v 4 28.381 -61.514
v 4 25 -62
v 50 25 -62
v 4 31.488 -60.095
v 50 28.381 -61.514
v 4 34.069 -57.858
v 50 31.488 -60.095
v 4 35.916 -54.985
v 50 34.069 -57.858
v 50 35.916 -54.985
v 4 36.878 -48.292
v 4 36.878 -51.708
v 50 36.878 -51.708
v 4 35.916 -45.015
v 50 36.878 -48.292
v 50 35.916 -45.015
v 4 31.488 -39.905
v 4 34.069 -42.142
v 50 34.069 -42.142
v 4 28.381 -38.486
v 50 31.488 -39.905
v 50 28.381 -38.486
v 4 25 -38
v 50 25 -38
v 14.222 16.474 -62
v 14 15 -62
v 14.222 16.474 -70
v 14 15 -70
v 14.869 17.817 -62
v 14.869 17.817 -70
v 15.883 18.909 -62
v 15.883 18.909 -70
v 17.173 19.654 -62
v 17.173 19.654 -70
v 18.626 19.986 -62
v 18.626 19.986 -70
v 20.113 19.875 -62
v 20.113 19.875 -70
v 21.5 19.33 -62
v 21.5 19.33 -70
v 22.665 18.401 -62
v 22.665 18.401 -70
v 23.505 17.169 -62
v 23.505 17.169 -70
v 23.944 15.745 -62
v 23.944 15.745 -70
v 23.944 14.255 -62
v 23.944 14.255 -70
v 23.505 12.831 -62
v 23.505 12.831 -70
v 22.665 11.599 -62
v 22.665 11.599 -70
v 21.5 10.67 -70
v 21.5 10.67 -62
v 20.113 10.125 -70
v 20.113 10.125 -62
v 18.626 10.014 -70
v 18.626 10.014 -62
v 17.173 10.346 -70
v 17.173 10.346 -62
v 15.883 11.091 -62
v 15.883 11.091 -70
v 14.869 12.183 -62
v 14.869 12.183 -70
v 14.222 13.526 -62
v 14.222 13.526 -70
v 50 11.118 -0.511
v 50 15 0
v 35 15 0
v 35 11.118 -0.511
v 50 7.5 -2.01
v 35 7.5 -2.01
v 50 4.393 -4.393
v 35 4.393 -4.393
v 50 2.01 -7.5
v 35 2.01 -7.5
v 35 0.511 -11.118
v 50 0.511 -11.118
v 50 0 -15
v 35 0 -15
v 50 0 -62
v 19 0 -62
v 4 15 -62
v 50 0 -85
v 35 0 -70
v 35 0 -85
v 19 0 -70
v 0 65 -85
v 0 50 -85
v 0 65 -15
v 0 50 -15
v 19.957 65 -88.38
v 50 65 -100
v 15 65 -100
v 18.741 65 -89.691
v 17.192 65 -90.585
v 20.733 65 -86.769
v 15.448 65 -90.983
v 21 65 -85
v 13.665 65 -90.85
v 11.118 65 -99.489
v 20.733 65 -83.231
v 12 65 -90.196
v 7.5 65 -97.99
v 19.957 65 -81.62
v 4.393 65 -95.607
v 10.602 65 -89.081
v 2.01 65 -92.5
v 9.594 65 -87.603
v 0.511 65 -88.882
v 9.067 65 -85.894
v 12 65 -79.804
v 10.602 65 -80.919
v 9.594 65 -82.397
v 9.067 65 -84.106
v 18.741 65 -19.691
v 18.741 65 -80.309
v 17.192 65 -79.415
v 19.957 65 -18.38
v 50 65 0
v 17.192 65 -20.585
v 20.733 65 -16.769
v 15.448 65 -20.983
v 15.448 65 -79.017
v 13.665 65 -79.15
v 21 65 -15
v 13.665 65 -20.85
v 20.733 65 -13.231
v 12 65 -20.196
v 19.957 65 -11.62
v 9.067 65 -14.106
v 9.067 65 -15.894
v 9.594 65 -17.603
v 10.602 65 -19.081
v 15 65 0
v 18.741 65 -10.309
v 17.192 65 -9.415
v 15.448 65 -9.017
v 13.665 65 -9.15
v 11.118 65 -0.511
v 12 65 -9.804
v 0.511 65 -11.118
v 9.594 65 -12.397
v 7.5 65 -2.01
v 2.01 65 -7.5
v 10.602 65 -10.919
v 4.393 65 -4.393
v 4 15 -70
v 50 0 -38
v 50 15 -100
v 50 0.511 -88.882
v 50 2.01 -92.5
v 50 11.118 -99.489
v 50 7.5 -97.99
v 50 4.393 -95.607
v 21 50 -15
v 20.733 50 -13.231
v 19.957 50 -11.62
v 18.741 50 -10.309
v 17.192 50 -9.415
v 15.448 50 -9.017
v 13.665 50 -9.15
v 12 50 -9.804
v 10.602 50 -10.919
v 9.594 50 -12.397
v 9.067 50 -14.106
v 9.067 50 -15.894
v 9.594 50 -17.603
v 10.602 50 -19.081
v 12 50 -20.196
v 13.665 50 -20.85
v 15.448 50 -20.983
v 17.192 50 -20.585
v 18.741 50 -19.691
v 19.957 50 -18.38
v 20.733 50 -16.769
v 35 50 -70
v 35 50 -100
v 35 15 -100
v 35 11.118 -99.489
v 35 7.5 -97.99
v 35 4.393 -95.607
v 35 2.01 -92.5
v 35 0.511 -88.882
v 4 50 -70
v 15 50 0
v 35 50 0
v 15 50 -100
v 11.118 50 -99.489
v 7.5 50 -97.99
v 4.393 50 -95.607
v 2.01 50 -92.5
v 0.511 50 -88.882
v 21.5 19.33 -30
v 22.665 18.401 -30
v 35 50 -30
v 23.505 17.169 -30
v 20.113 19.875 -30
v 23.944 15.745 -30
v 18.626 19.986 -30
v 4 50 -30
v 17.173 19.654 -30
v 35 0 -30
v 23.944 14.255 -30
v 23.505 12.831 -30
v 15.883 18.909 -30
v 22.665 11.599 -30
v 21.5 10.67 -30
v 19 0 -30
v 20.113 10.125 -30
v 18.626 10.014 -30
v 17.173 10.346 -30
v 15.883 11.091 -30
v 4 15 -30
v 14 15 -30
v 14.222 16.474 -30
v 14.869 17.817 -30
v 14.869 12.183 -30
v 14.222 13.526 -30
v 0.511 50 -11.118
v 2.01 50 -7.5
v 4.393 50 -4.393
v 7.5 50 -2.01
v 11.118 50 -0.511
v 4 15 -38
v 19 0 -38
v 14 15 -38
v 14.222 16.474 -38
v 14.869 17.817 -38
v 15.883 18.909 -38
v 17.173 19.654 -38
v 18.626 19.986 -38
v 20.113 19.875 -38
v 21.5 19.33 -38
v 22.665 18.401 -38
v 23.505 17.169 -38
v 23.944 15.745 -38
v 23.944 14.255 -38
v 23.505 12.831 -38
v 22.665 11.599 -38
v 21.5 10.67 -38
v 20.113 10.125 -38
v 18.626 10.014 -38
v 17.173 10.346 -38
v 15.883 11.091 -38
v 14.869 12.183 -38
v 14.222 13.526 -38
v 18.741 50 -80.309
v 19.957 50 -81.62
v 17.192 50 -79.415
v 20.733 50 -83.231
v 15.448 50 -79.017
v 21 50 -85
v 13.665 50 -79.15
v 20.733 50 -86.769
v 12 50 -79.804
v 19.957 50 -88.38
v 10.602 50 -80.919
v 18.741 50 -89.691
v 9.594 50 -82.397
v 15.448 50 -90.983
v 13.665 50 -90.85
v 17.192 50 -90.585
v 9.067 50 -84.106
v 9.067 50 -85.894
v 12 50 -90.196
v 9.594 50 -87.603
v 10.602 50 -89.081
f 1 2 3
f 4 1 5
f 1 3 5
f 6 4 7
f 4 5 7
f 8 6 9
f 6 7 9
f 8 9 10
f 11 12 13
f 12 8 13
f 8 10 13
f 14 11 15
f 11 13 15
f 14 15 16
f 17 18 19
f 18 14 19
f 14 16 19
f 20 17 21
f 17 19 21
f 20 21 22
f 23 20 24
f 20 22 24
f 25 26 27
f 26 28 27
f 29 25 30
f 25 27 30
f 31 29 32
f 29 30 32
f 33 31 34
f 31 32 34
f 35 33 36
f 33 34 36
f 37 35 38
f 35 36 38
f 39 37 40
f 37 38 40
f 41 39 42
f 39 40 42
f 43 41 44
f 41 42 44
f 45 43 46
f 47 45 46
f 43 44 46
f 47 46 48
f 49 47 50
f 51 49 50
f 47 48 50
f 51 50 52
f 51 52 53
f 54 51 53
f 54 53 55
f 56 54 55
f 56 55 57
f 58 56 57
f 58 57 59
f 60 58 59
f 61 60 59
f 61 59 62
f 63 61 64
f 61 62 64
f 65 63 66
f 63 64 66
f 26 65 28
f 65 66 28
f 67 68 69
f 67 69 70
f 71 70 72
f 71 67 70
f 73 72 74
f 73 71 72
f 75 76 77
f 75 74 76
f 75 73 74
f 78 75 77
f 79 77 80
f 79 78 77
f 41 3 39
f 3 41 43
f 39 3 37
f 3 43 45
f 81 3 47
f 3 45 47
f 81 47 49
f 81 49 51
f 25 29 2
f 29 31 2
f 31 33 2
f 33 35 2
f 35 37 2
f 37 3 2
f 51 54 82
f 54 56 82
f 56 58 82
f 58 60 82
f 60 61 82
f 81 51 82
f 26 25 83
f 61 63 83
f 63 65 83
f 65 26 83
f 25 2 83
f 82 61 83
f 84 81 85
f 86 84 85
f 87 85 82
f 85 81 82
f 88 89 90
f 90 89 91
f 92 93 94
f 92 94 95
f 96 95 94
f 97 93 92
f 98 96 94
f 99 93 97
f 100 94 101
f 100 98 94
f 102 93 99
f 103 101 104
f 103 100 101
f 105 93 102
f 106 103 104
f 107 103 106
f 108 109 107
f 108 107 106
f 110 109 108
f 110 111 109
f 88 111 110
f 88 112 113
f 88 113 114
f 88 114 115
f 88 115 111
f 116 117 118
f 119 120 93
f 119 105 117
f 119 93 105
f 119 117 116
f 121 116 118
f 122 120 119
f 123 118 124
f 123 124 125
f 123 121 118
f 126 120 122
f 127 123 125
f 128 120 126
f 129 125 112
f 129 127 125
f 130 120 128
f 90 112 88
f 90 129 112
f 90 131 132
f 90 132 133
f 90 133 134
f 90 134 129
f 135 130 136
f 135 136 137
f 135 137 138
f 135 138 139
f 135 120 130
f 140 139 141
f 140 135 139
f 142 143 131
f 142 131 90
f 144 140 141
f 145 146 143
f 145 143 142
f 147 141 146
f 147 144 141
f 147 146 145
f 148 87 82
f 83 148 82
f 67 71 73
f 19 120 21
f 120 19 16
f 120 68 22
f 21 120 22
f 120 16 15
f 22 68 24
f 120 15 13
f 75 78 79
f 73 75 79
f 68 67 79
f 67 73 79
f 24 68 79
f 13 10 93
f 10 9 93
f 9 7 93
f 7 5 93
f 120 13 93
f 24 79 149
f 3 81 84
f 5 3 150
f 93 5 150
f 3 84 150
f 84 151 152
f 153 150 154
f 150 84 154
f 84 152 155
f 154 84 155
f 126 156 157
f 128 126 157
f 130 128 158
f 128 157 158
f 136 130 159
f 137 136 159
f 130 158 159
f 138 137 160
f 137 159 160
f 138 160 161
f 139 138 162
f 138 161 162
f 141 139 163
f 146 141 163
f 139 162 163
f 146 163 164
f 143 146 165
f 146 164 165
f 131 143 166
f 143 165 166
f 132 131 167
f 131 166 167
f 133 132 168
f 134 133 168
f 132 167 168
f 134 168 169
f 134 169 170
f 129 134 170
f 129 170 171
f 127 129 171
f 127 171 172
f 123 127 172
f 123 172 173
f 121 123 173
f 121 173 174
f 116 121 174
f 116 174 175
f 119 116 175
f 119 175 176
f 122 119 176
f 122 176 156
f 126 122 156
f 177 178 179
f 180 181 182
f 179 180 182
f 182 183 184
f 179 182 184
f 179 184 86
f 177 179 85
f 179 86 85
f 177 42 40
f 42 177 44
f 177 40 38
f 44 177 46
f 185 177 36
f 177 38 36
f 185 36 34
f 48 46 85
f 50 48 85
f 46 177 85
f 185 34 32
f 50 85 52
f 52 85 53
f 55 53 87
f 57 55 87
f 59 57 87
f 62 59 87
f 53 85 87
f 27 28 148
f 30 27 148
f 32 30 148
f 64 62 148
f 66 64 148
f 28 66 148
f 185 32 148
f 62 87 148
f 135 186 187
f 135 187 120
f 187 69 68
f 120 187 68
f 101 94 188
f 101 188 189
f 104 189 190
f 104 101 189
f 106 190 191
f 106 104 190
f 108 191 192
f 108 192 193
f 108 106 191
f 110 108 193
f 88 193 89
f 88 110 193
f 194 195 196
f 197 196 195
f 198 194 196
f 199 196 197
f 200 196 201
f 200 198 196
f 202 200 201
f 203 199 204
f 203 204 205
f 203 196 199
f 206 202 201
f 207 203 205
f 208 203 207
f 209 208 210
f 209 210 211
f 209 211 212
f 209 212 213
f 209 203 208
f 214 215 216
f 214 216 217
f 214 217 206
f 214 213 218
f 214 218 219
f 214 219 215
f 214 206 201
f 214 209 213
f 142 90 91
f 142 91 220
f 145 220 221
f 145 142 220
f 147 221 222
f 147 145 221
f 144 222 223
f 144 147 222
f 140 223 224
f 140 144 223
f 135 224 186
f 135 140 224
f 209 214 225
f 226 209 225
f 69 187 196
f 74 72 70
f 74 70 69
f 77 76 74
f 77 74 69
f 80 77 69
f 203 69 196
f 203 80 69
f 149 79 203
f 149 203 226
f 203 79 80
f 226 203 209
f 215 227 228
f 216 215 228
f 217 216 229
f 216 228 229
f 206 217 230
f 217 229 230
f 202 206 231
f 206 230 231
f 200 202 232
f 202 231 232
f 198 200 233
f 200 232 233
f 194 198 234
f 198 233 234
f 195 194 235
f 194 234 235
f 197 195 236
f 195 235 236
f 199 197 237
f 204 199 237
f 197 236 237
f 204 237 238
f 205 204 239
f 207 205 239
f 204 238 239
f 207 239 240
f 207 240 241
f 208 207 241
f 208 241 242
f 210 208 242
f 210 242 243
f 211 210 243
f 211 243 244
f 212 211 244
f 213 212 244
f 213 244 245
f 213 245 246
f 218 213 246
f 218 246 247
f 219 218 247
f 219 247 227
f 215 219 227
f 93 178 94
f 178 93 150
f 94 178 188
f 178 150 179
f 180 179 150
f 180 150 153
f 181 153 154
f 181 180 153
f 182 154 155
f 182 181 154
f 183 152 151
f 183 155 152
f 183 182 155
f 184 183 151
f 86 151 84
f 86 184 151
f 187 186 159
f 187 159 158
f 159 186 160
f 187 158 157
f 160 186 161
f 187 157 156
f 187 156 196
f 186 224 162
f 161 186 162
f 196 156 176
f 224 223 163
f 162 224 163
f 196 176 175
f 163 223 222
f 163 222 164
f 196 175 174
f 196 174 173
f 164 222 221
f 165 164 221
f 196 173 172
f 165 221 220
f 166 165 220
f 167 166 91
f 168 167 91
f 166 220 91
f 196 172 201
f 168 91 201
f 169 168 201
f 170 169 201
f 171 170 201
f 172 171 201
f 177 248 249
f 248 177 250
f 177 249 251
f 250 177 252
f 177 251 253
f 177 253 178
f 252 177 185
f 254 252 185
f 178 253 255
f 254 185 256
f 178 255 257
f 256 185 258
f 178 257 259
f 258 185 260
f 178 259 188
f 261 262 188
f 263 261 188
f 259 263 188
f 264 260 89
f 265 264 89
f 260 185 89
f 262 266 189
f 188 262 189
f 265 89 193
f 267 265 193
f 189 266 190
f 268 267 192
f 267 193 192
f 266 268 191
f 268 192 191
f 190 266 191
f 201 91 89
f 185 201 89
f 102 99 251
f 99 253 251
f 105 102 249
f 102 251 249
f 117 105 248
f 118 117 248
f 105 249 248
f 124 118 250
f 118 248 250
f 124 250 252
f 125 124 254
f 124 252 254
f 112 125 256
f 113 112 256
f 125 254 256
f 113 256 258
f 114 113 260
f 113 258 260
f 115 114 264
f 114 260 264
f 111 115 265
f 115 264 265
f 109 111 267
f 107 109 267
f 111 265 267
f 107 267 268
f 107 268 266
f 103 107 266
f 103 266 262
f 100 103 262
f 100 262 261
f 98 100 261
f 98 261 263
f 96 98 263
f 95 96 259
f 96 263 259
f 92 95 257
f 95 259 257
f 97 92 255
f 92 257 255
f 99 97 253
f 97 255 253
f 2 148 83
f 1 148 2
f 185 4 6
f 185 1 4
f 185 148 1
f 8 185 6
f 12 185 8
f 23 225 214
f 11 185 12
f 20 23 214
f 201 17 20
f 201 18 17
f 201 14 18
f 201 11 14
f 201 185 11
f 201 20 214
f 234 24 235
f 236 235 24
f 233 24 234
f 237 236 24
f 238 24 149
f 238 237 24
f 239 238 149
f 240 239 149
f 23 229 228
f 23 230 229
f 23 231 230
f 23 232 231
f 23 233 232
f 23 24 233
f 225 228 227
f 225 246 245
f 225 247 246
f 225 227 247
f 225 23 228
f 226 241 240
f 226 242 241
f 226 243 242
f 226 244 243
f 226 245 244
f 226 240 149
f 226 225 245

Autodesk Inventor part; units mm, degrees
ref_plane "YZ Plane" through (0, 0, 0) normal (1, 0, 0) x (0, 1, 0)
ref_plane "XZ Plane" through (0, 0, 0) normal (0, 1, 0) x (-1, 0, 0)
ref_plane "XY Plane" through (0, 0, 0) normal (0, 0, 1) x (1, 0, 0)
sketch "Sketch1" plane through (0, 0, 0) normal (0, 1, 0) x (-1, 0, 0)
  line L0 (0, 0) -> (-50, 0)
  line L1 (-50, 0) -> (-50, -100)
  line L2 (-50, -100) -> (0, -100)
  line L3 (0, -100) -> (0, 0)
  dimension "d0" = 50
  dimension "d1" = 100
extrude "Extrusion1" add sketch "Sketch1" along normal blind 65
sketch "Sketch2" plane through (50, 0, 0) normal (1, 0, 0) x (0, 0, -1)
  line L0 (0, 0) -> (100, 0) projected
  line L1 (50, 0) -> (50, 25)
  circle A0 centre (50, 25) radius 12
  line L2 (0, 65) -> (100, 65) projected
  line L3 (50, 65) -> (50, 25)
  dimension "d5" = 24
  dimension "d15" = 40
  dimension "d16" = 40
extrude "Extrusion2" cut sketch "Sketch2" against normal blind 65
sketch "Sketch3" plane through (0, 0, -100) normal (-1, 0, 0) x (0, 0, 1)
  circle A0 centre (50, 25) radius 12 projected
  line L0 (0, 0) -> (100, 0) projected
  line L1 (62.5625, 0) -> (38, 0)
  circle A1 centre (50, 25) radius 12 projected
  line L2 (0, 0) -> (100, 0) projected
  line L3 (100, 0) -> (100, 65) projected
  line L4 (0, 65) -> (100, 65) projected
  line L5 (0, 0) -> (0, 65) projected
  line L6 (62, 25) -> (62, 0)
  line L7 (38, 25) -> (38, 0)
  line L8 (100, 0) -> (0, 0) projected
extrude "Extrusion3" cut sketch "Sketch3" against normal blind 65 contours L6 L0 L7 A0
sketch "Sketch4" plane through (0, 0, 0) normal (0, -1, 0) x (1, 0, 0)
  line L0 (0, -100) -> (0, 0) projected
  line L1 (0, -100) -> (35, -100)
  line L2 (35, -100) -> (35, -70)
  line L3 (35, -70) -> (0, -70)
  line L4 (0, -70) -> (0, -100)
  line L5 (0, 0) -> (50, 0) projected
  line L6 (0, 0) -> (35, 0)
  line L7 (35, 0) -> (35, -30)
  line L8 (35, -30) -> (0, -30)
  line L9 (0, -30) -> (0, 0)
  dimension "d10" = 35
  dimension "d11" = 30
  dimension "d12" = 30
extrude "Extrusion4" cut sketch "Sketch4" against normal blind 50
sketch "Sketch5" plane through (0, 65, -100) normal (-1, 0, 0) x (0, 0, 1)
  line L0 (0, -15) -> (30, -15) projected
  line L1 (30, -15) -> (30, -65) projected
  line L2 (30, -65) -> (38, -65) projected
  line L3 (38, -65) -> (38, -40) projected
  arc A0 (62, -40) -> (38, -40) centre (50, -40) ccw projected
  line L4 (62, -40) -> (62, -65) projected
  line L5 (62, -65) -> (70, -65) projected
  line L6 (70, -65) -> (70, -15) projected
  line L7 (70, -15) -> (100, -15) projected
  line L8 (100, -15) -> (100, 0) projected
  line L9 (0, 0) -> (100, 0) projected
  line L10 (0, -15) -> (0, 0) projected
  line L11 (70, -15) -> (30, -15)
  point P0 (100, -65)
extrude "Extrusion5" cut sketch "Sketch5" against normal blind 4 contours L11 L6 L5 L4 A0 L3 L2 L1
sketch "Sketch6" plane through (35, 0, -70) normal (0, 0, -1) x (-1, 0, 0)
  circle A0 centre (16, 15) radius 5
  line L0 (31, 0) -> (31, 50) projected
  line L1 (31, 0) -> (0, 0) projected
  point P0 (35, 0)
  dimension "d19" = 10
  dimension "d20" = 15
  dimension "d21" = 15
extrude "Extrusion6" cut sketch "Sketch6" against normal through all
chamfer "Chamfer1" distance 15 angle 45 2 edges at (4, 0, -34) (4, 0, -66)
fillet "Fillet1" radius 15 4 edges at (42.5, 0, 0) (42.5, 0, -100) (0, 57.5, -100) (0, 57.5, 0)
sketch "Sketch7" plane through (0, 50, 0) normal (0, -1, 0) x (1, 0, 0)
  circle A0 centre (15, -85) radius 6
  circle A1 centre (15, -15) radius 6
  line L0 (0, -85) -> (0, -15) projected
  line L1 (15, 0) -> (35, 0) projected
  line L2 (35, -100) -> (15, -100) projected
  point P0 (0, 0)
  dimension "d28" = 12
  dimension "d29" = 12
  dimension "d30" = 15
  dimension "d31" = 15
  dimension "d32" = 15
  dimension "d33" = 15
extrude "Extrusion7" cut sketch "Sketch7" against normal through all
properties part number "Block4" material "Brass, Soft Yellow"
